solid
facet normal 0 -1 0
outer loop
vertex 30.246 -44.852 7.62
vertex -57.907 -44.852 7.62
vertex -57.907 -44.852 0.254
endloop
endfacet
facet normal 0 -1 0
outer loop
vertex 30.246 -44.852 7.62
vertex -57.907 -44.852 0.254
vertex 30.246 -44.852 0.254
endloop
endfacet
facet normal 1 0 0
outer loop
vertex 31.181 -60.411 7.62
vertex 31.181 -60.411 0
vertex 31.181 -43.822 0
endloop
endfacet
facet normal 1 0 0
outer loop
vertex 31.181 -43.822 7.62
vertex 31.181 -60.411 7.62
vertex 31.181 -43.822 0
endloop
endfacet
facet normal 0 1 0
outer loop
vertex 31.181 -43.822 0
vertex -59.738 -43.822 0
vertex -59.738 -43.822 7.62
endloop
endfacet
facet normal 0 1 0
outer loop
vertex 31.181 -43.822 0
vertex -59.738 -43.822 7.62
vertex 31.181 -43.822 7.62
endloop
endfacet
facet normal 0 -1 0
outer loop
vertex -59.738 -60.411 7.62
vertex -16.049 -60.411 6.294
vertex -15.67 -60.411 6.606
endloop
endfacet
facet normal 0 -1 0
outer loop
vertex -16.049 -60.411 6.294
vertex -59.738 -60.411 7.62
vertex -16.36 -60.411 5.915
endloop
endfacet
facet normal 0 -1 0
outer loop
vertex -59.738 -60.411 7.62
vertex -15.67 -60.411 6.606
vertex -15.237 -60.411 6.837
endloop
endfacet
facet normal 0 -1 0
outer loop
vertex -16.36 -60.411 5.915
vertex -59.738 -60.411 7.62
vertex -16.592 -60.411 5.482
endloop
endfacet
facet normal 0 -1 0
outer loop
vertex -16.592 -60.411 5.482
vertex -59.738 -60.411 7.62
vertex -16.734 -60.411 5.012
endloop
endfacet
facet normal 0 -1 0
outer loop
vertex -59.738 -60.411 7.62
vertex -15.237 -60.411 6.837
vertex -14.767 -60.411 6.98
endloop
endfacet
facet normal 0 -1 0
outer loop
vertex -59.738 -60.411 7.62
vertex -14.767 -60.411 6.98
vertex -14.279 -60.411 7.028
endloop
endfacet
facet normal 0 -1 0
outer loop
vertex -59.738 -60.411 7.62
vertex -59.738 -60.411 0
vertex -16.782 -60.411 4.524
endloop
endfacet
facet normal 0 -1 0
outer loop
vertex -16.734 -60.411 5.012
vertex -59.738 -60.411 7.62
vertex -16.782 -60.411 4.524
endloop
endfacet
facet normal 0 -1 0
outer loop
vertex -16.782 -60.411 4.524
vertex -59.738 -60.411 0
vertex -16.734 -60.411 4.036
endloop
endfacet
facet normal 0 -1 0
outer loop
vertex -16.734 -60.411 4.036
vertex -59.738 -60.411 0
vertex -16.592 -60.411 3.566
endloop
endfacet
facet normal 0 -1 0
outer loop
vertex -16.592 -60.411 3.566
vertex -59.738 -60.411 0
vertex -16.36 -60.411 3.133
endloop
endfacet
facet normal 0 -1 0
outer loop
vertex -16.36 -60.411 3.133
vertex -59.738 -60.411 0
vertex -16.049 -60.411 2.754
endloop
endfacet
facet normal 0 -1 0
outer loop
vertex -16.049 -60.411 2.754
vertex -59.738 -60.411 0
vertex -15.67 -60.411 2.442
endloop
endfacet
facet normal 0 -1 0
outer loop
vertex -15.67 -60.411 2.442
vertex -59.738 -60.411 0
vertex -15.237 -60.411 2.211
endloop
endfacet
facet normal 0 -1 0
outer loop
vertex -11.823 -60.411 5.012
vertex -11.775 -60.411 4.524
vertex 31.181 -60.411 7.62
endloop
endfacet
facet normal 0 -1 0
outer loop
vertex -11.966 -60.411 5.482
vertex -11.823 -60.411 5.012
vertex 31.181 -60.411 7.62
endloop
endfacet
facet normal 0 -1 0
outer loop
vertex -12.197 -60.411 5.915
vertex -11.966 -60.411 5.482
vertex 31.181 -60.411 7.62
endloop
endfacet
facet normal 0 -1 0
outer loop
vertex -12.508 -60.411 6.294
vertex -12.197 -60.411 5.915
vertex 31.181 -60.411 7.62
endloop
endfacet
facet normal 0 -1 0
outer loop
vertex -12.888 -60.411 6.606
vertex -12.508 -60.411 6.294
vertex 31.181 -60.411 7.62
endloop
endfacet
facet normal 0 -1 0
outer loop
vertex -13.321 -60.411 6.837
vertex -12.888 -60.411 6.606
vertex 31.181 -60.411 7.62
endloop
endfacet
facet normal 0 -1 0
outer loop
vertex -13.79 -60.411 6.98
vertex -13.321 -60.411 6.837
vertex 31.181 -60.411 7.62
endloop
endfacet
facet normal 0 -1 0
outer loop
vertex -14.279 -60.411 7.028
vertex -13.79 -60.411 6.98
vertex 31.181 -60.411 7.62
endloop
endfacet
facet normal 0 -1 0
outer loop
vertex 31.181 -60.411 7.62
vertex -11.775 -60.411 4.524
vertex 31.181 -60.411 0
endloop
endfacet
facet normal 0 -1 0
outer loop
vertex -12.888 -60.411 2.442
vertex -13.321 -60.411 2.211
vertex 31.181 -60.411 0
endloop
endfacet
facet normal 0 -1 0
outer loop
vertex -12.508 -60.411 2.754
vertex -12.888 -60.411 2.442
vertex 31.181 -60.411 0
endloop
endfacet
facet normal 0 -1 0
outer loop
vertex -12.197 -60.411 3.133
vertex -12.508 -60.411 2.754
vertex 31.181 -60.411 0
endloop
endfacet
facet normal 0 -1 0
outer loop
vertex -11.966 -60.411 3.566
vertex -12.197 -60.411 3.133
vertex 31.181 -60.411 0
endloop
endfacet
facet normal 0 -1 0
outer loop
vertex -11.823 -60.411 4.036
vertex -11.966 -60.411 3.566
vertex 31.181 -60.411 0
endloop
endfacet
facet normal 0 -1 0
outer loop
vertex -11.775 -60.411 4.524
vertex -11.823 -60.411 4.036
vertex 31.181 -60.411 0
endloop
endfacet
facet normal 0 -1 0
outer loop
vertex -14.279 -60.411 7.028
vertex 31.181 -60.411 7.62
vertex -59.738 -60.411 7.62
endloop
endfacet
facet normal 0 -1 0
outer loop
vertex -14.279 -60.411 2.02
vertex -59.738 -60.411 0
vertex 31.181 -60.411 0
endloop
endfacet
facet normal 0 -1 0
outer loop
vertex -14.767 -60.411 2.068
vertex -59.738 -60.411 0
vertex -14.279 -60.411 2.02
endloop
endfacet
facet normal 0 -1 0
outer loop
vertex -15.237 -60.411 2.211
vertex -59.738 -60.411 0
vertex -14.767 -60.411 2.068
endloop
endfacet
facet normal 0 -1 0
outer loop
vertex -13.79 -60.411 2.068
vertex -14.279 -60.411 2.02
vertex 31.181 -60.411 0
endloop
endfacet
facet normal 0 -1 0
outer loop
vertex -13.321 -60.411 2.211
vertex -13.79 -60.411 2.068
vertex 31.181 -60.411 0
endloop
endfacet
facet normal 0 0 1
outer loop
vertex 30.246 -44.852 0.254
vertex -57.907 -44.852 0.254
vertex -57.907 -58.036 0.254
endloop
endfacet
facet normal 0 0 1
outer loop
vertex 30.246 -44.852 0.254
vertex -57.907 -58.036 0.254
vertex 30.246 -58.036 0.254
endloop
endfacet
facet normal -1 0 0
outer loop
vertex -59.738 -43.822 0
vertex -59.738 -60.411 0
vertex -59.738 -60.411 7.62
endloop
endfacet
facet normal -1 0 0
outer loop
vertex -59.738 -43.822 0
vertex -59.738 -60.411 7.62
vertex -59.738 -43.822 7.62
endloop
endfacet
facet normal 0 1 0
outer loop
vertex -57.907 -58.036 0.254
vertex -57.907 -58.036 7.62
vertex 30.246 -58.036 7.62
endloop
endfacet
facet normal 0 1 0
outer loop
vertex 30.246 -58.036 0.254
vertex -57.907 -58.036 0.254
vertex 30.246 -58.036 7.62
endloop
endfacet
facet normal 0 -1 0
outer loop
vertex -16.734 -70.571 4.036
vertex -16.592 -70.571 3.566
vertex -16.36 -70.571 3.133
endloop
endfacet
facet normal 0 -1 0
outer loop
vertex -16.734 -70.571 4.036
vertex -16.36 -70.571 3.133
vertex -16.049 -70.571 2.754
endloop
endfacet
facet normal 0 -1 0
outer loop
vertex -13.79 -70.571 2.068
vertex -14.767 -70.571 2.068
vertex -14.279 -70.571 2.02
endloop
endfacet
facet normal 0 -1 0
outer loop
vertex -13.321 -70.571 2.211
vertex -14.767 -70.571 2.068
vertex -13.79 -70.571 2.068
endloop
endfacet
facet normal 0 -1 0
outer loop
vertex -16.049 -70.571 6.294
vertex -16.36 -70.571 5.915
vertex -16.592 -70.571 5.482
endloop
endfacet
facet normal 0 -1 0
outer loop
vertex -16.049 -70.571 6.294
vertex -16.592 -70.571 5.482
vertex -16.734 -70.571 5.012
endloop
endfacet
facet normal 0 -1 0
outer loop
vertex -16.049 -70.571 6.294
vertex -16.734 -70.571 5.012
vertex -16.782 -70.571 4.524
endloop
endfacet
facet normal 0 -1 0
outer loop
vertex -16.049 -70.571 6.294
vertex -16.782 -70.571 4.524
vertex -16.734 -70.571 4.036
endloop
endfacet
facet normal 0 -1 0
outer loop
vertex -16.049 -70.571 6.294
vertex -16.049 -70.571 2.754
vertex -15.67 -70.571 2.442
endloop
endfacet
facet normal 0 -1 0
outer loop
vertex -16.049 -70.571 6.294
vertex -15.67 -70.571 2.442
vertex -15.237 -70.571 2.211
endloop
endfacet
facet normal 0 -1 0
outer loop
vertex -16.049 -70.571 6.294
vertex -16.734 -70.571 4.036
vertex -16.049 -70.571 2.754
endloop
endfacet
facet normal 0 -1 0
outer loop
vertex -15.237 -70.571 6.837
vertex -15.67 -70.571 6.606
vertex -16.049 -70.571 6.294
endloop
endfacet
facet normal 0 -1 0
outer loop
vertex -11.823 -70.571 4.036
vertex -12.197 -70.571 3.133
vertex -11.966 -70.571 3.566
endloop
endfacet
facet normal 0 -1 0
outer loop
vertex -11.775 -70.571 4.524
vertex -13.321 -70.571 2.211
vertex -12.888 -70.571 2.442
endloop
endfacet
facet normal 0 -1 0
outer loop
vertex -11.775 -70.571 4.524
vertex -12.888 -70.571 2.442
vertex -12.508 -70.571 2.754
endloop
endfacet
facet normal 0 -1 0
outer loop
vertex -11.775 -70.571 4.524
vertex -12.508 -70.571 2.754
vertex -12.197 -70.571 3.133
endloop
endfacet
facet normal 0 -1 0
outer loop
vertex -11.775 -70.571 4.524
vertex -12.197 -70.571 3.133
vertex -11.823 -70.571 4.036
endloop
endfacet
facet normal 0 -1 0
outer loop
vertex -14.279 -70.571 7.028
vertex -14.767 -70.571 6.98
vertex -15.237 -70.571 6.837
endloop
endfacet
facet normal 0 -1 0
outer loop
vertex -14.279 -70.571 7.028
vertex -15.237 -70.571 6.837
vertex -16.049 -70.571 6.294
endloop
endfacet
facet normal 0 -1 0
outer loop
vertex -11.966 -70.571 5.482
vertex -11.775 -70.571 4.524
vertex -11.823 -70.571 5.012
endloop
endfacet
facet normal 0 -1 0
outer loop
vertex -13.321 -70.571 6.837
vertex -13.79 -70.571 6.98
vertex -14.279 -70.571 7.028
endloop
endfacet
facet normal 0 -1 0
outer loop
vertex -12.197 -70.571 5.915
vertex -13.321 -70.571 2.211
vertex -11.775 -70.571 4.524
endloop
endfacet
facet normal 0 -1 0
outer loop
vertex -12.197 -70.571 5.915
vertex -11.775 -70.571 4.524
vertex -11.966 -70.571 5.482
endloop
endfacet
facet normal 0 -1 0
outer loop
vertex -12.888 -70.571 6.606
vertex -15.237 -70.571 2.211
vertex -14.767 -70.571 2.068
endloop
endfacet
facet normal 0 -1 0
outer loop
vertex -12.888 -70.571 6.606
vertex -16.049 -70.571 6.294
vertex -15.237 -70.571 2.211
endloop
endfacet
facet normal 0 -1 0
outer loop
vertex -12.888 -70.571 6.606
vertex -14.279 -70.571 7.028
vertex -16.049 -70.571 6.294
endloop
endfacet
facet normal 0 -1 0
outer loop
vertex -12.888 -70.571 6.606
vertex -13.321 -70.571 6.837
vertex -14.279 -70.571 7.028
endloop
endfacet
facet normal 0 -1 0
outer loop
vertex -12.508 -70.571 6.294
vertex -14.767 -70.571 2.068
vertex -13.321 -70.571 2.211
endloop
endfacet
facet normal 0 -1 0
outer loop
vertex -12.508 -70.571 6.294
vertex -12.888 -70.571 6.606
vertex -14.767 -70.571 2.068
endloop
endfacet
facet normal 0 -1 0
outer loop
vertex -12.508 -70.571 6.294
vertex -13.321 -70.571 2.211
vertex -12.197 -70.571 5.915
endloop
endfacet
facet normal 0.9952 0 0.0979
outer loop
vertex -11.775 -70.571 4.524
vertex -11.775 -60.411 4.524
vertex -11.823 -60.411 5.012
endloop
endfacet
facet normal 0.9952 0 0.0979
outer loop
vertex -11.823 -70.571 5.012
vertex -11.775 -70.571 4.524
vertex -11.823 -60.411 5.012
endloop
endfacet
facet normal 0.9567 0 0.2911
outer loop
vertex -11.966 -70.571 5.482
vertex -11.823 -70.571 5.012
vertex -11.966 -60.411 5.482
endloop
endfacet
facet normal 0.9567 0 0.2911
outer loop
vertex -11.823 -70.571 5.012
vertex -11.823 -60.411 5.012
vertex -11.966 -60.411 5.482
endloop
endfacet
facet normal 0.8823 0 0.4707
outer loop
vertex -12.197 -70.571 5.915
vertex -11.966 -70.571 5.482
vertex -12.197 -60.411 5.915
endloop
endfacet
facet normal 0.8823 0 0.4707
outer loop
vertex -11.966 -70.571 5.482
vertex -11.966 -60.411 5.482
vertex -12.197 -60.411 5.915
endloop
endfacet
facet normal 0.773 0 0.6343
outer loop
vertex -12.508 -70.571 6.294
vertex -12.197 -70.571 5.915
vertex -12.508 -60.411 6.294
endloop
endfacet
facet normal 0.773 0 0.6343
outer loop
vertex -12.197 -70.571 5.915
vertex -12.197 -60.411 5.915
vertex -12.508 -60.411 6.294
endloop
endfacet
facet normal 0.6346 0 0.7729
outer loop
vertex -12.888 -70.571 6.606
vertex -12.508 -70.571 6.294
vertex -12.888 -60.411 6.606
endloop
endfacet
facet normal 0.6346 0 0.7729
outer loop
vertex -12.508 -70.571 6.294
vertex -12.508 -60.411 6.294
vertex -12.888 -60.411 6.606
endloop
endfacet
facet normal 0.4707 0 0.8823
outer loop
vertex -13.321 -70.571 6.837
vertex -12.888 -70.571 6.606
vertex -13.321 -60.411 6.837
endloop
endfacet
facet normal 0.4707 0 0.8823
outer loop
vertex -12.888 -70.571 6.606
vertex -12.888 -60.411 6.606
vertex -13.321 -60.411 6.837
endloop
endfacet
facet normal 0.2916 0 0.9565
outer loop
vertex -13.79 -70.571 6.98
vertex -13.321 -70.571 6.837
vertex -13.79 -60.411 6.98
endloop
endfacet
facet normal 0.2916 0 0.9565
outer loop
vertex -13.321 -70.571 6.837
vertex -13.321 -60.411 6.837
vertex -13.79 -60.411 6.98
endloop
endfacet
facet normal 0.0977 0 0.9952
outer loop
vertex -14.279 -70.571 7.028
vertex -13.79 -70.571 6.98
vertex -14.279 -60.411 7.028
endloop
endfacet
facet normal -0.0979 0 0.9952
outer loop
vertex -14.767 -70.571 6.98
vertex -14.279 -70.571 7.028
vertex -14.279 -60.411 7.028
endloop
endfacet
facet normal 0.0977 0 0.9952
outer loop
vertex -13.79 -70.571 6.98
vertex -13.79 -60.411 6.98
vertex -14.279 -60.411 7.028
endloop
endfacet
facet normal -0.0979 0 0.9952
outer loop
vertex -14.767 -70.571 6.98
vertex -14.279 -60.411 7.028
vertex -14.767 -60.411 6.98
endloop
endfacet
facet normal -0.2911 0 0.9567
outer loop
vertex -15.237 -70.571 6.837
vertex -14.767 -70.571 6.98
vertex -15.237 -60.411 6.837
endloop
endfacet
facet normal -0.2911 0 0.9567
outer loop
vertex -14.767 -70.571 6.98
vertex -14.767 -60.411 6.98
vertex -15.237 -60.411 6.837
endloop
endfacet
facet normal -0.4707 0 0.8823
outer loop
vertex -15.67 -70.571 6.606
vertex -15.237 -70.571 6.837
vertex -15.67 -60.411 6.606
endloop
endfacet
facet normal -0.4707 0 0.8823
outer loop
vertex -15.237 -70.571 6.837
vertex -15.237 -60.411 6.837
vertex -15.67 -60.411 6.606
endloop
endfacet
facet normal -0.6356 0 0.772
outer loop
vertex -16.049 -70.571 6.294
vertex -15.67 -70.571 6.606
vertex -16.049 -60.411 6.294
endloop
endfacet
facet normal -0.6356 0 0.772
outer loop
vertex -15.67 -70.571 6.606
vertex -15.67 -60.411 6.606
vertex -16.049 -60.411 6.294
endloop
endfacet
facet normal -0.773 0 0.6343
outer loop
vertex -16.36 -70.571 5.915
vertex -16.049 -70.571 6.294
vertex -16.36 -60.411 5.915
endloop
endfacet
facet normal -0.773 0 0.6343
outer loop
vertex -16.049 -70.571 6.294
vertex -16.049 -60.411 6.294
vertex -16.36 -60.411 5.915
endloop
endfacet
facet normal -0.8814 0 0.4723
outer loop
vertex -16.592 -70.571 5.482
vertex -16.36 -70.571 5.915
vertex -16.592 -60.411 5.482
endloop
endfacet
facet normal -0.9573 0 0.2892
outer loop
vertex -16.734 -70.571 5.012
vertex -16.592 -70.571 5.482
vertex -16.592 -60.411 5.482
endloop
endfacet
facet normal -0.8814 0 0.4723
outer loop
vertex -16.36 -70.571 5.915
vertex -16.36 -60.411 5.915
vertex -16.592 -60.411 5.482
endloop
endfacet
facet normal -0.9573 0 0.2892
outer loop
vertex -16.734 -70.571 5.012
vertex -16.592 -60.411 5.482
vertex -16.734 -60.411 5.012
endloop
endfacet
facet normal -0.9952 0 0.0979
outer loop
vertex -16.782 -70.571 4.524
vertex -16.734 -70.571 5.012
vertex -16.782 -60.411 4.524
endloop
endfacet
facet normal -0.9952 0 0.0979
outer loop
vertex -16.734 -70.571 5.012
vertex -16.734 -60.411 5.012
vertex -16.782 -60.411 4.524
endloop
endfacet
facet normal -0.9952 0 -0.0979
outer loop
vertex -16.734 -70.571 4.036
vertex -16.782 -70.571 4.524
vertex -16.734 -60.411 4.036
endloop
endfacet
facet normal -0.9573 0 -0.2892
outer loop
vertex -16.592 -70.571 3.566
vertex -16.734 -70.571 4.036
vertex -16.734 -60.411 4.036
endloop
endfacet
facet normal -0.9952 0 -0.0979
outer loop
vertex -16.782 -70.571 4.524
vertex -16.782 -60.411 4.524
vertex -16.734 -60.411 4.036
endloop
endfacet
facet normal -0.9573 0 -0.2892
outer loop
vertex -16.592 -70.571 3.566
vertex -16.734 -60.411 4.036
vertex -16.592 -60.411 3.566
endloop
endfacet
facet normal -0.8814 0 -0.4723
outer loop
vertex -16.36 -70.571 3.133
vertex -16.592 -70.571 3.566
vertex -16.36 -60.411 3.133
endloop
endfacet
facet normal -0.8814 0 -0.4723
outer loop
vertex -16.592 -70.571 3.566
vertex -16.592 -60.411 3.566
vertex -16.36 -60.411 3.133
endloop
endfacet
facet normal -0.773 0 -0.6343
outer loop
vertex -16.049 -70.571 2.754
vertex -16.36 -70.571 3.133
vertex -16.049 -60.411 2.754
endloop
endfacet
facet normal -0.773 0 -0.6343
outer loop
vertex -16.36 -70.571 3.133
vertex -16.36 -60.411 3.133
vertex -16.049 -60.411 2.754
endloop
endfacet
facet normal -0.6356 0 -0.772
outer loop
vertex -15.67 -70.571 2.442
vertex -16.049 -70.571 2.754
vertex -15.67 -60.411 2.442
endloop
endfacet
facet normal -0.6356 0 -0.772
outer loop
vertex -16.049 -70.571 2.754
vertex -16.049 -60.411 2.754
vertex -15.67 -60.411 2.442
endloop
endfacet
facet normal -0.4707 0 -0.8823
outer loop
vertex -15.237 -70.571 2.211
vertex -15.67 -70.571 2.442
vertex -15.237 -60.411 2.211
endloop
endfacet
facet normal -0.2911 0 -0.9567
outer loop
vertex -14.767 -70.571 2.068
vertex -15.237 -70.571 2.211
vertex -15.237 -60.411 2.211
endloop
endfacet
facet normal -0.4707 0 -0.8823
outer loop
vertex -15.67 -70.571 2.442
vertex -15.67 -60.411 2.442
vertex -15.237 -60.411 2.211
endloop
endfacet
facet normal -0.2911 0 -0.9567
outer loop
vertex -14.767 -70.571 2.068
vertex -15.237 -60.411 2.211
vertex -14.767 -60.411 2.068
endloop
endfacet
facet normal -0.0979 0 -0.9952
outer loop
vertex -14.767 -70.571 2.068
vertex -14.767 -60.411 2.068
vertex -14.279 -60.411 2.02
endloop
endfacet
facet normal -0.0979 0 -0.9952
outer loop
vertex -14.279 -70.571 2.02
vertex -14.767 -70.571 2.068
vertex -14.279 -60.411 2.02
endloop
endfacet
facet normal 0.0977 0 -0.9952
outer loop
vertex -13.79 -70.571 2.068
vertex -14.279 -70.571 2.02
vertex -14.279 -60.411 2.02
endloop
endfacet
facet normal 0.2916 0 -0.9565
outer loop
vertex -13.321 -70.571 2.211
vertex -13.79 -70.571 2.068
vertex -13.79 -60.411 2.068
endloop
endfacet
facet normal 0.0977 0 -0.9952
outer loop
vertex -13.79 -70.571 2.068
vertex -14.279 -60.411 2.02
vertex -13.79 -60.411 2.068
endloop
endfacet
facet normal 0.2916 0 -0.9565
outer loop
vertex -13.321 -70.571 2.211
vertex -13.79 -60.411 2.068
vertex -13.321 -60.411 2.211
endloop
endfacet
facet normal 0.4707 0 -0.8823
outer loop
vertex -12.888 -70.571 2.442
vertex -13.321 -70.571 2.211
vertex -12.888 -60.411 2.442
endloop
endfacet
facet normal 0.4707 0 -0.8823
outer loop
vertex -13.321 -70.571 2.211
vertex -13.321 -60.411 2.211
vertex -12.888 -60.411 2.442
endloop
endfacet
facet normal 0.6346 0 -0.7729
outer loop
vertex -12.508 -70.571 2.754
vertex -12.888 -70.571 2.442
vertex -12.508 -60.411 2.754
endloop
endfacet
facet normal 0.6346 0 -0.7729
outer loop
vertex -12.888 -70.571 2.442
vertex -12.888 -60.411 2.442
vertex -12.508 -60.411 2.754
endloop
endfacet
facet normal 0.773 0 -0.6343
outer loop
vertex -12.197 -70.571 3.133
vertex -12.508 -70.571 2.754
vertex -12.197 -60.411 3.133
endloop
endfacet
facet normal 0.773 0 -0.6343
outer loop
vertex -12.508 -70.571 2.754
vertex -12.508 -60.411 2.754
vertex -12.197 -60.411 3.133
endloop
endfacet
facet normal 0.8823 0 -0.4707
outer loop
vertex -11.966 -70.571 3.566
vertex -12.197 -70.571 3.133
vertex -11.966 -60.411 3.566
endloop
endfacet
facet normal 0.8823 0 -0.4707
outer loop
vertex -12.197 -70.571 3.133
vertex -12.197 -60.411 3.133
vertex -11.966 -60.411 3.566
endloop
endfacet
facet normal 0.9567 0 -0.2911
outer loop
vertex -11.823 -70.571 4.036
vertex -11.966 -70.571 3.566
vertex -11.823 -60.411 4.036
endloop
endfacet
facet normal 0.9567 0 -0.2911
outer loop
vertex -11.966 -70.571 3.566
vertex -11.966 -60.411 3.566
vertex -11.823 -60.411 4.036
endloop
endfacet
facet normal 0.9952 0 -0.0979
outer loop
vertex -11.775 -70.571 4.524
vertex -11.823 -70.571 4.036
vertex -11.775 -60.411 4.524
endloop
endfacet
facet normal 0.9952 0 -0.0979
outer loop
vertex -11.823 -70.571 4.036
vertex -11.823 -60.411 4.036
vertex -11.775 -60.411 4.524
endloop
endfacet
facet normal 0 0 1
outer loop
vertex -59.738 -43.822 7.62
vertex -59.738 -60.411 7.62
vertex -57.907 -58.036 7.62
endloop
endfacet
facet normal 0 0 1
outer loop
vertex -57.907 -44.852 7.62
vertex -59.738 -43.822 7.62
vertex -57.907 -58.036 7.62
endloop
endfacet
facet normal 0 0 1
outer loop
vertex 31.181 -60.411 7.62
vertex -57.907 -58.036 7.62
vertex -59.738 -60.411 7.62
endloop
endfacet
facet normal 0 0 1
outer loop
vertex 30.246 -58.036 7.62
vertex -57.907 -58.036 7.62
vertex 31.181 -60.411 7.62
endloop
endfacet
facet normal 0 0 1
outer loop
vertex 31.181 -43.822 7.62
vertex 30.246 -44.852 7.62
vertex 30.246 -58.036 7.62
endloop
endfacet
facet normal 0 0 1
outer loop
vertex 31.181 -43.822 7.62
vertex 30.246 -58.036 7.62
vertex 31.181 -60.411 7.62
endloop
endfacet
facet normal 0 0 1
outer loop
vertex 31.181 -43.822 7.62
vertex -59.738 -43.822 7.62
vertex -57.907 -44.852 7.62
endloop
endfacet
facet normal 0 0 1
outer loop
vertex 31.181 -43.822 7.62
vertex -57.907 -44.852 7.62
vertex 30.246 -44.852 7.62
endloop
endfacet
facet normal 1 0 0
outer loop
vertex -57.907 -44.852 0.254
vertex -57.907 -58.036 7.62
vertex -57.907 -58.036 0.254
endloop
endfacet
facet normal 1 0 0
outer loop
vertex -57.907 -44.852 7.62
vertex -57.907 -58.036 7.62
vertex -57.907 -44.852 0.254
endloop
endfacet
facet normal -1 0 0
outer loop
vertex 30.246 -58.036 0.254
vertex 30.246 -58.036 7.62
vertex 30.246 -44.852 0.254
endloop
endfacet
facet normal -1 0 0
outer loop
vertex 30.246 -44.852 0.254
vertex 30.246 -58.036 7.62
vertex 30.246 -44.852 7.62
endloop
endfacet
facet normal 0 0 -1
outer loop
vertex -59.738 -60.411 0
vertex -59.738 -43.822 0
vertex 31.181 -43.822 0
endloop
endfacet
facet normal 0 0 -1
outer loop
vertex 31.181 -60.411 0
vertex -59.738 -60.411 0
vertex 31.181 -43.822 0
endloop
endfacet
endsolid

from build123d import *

# Parameters (mm, degrees)
F0_W     = 90.9192115068
F0_H     = 16.5890082717
F1_DEPTH = 7.62
F3_R     = 2.5036388288
F4_DEPTH = 10.16
F2_W     = 88.1531853229
F2_H     = 13.1842046976
F5_DEPTH = 7.366


with BuildPart() as f1:
    # F0 (on Top) → F1 (new body)
    with BuildSketch(Plane.XY):
        with Locations((-14.278691262, -52.1163344383)):
            Rectangle(F0_W, F0_H)
    extrude(amount=F1_DEPTH)

    # F3 (on face) → F4 (join)
    with BuildSketch(Plane.XZ.offset(60.4108385742)):
        with Locations((-14.278691262, 4.5239902101)):
            Circle(F3_R)
    extrude(amount=F4_DEPTH)

    # F2 (on face) → F5 (cut)
    with BuildSketch(Plane.XY.offset(7.62)):
        with Locations((-13.8304857537, -51.4442324638)):
            Rectangle(F2_W, F2_H)
    extrude(amount=-F5_DEPTH, mode=Mode.SUBTRACT)


solid = f1.part
